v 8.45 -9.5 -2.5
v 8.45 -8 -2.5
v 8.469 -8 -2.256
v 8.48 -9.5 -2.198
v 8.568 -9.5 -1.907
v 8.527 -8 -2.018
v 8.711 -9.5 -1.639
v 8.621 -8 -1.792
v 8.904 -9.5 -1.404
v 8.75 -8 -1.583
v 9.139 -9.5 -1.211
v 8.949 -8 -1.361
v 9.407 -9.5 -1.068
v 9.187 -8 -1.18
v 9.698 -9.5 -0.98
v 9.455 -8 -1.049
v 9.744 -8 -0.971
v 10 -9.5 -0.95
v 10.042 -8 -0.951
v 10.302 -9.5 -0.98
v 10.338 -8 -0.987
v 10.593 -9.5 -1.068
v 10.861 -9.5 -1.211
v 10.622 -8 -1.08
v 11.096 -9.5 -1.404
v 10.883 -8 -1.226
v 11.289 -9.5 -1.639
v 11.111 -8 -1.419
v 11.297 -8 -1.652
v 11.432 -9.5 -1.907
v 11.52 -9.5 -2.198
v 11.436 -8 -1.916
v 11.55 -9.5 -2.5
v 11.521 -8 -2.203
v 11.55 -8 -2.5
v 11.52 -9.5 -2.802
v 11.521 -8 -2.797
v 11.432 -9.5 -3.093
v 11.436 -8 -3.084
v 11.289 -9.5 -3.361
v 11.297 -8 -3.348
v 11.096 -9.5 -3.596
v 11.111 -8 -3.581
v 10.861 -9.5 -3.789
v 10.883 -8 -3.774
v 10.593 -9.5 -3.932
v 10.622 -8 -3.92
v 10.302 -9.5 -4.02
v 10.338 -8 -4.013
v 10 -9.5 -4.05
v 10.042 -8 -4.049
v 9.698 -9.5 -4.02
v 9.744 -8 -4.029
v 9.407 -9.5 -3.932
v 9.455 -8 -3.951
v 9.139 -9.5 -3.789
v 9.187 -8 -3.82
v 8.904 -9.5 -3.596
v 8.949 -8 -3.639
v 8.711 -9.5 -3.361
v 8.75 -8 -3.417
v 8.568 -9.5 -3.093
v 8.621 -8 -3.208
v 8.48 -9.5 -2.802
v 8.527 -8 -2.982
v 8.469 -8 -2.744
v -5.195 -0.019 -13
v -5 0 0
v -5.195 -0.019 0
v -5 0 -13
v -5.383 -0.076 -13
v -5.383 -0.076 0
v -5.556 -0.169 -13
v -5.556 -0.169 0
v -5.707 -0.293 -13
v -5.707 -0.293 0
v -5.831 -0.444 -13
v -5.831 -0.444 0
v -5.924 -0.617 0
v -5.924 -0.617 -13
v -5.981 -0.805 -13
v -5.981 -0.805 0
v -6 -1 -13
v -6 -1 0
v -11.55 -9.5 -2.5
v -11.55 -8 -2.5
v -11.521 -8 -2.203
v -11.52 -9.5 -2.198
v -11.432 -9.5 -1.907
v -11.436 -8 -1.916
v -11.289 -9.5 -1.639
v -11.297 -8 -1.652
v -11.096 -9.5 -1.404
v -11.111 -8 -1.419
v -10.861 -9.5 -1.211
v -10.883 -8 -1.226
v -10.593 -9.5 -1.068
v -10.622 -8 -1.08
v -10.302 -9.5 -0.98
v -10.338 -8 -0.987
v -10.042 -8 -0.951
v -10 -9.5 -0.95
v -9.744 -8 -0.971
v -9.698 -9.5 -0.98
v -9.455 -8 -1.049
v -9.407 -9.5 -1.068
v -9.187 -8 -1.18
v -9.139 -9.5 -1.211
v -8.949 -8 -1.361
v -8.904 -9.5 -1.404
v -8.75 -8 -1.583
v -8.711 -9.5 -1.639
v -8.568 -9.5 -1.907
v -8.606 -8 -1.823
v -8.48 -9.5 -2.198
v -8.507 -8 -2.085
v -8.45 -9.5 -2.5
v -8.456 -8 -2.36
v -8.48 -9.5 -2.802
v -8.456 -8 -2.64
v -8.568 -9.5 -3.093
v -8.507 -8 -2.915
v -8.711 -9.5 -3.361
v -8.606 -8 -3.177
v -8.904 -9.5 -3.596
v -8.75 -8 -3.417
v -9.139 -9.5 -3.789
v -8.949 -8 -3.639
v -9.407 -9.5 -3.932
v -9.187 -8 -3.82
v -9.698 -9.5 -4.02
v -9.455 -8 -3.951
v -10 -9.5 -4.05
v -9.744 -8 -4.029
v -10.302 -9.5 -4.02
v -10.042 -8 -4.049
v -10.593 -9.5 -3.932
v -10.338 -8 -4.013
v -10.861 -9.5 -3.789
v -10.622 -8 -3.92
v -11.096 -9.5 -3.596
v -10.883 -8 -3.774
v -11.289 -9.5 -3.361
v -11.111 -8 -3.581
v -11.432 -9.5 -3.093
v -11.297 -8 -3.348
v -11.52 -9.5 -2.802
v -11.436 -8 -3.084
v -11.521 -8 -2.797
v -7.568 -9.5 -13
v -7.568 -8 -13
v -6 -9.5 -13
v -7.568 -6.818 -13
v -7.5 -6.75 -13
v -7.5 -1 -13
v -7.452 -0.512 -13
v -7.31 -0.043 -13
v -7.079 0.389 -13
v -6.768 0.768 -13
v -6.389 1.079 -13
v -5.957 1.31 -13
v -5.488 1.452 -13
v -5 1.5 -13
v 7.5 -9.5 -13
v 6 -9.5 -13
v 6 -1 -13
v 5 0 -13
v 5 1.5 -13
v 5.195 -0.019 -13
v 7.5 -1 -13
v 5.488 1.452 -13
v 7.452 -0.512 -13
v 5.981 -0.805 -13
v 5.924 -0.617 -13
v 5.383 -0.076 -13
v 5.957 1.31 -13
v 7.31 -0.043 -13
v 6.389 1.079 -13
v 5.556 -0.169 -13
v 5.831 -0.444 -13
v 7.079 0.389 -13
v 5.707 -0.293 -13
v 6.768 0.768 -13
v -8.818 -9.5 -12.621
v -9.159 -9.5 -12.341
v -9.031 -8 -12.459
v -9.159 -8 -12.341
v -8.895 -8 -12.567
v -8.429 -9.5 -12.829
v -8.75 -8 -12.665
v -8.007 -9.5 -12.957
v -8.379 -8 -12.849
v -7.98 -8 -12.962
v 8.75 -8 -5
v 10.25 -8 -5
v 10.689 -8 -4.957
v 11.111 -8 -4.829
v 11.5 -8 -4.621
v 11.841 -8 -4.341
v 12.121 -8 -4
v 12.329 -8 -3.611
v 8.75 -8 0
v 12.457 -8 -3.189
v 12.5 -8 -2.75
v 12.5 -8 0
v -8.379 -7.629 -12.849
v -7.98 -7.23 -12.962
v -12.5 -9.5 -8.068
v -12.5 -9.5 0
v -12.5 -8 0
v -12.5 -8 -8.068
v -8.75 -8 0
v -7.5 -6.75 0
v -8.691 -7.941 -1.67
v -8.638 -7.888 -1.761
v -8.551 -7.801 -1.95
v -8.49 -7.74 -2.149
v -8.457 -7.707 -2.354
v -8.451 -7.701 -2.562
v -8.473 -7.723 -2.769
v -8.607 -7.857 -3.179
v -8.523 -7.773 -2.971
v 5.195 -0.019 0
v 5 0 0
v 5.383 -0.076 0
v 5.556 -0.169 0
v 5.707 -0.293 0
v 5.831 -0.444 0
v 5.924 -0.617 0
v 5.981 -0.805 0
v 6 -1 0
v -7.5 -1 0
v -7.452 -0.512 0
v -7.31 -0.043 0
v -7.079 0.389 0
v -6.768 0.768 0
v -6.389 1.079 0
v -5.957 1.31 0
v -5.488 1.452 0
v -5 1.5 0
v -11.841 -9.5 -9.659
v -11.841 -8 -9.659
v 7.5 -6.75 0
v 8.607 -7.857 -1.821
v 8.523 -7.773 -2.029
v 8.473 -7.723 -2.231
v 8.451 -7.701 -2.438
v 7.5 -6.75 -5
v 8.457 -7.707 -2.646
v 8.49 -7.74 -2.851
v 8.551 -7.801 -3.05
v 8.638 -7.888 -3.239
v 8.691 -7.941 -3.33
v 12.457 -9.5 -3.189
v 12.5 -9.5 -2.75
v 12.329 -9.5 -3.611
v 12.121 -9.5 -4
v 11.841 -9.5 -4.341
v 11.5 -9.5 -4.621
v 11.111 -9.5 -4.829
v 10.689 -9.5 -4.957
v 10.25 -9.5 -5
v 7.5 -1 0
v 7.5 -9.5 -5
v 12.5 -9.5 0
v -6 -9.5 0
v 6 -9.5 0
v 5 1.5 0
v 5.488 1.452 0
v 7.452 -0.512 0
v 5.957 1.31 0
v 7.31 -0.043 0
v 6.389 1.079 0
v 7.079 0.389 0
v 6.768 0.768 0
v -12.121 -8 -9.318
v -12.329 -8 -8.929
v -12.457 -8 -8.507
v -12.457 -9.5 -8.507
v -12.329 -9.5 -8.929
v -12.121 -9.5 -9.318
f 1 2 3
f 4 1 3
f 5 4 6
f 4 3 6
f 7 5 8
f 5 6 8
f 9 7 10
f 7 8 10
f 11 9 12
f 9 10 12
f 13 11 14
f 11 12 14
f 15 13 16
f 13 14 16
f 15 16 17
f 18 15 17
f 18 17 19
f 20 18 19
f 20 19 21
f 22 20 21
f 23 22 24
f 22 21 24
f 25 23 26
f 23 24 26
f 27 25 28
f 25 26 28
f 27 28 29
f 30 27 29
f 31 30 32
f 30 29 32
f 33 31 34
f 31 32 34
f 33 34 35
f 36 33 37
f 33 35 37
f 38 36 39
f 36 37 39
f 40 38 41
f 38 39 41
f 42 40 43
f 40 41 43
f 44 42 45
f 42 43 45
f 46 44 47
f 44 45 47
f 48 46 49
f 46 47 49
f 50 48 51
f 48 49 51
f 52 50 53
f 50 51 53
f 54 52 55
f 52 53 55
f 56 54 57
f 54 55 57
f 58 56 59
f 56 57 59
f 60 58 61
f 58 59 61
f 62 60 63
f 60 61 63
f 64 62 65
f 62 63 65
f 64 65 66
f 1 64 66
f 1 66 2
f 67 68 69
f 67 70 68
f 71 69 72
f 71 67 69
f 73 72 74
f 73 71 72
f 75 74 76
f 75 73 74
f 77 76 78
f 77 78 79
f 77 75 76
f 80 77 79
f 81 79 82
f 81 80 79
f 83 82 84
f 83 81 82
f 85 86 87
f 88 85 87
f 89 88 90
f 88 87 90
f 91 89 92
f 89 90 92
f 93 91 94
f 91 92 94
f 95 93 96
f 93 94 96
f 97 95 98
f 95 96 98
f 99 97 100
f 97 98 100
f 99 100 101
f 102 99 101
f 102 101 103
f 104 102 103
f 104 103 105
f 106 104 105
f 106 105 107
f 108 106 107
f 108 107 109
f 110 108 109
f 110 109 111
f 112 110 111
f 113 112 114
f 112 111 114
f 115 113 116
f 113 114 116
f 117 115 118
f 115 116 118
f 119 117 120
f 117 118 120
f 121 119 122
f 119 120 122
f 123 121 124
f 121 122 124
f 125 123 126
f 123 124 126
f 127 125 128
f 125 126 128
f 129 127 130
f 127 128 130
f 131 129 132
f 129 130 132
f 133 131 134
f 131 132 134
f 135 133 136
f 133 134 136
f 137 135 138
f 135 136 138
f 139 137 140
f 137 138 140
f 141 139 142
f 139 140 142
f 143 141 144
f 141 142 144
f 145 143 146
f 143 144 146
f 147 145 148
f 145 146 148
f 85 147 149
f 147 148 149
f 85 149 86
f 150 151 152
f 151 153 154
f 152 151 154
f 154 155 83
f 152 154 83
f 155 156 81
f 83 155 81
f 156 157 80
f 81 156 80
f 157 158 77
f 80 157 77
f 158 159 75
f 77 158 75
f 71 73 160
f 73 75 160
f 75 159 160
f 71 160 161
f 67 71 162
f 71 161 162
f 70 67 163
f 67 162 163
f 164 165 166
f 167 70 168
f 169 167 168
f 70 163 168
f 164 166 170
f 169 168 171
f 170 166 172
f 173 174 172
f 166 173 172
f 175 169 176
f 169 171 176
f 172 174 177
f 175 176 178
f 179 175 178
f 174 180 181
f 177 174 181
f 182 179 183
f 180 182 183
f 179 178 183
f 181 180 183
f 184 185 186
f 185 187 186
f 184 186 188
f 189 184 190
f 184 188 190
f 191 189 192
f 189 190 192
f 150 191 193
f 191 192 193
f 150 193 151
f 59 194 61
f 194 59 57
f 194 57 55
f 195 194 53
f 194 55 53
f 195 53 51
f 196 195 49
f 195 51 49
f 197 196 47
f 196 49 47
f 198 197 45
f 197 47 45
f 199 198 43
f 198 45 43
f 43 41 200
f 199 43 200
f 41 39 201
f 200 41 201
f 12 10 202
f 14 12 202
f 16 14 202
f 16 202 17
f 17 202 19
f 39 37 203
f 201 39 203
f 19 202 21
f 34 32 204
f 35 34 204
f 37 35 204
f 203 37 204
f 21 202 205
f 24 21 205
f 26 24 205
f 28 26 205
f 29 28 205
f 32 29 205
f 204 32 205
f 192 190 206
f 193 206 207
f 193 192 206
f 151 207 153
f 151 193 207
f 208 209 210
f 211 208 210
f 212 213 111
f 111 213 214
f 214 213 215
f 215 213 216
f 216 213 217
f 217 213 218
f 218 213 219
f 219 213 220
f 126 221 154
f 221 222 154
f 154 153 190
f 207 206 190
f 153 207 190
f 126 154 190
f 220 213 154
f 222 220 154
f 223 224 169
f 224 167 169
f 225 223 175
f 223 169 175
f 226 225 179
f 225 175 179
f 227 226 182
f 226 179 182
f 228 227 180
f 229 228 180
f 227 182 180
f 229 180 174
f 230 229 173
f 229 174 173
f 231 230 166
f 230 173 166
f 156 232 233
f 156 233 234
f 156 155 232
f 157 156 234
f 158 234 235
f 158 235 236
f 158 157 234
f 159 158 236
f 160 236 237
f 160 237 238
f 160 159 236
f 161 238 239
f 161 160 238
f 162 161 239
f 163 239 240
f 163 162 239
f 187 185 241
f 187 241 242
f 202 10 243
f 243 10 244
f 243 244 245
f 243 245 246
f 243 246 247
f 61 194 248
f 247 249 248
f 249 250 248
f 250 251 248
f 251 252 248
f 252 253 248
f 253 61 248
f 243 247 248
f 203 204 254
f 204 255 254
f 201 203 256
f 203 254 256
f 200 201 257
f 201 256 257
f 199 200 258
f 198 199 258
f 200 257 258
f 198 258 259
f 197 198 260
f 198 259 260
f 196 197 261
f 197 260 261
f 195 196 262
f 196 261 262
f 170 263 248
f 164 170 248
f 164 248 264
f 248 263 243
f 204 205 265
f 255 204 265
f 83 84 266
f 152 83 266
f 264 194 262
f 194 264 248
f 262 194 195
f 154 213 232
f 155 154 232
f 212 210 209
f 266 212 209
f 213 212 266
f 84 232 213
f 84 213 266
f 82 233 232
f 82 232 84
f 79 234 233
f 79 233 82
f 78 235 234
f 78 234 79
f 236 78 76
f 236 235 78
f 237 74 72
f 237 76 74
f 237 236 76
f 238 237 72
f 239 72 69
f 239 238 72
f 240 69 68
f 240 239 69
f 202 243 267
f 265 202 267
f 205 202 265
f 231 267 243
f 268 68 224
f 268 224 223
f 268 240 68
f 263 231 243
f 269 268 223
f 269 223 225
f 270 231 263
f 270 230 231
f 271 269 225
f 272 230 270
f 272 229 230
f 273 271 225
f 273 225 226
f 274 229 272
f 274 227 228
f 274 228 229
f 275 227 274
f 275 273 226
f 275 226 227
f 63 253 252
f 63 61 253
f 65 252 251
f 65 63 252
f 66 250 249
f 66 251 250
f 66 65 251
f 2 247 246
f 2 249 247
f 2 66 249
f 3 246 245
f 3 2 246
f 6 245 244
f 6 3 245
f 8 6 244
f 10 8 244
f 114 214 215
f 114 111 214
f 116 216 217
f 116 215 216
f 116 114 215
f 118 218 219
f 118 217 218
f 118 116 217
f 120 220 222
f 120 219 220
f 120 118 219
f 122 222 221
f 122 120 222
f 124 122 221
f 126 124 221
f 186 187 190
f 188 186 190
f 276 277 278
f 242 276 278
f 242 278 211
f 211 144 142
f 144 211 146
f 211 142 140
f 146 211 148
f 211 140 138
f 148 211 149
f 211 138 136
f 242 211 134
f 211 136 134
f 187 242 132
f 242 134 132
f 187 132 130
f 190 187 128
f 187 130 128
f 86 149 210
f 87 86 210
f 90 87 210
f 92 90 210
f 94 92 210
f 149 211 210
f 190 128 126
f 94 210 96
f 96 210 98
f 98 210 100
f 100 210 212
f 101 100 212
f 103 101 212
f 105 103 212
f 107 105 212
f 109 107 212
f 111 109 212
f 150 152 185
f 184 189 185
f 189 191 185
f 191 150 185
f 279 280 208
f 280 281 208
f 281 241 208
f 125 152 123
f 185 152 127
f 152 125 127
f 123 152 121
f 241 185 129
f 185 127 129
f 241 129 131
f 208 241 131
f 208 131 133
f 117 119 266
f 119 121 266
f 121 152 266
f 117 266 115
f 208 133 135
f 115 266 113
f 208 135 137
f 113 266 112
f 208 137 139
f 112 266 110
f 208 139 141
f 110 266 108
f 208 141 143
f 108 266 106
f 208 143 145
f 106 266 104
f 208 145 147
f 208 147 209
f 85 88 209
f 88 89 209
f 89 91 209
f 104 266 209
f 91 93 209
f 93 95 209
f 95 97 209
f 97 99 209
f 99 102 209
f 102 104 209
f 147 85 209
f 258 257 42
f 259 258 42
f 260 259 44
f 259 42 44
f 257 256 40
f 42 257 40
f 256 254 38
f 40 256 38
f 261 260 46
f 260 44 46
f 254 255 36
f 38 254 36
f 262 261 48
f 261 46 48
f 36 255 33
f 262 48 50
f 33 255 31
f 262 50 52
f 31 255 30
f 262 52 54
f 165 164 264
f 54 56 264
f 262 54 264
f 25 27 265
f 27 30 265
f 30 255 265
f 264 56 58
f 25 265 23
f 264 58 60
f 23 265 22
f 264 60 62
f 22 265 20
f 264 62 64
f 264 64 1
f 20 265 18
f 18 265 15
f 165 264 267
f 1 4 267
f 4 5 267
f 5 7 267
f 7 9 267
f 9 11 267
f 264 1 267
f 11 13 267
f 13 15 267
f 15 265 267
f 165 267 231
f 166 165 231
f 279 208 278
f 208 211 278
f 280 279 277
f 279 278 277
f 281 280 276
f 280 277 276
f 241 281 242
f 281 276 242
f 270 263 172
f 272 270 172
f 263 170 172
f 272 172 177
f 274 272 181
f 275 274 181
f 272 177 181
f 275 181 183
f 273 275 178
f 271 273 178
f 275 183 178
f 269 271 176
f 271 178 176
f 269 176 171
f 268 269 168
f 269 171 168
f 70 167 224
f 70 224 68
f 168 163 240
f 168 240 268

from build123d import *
from build123d.topology import SkipClean

# Parameters (mm, degrees)
BOSS_EXTRUDE1_DEPTH = 13
SKETCH2_W           = 5
SKETCH2_H           = 8
CUT_EXTRUDE1_DEPTH  = 21.383817111
SKETCH3_R           = 1.55
CUT_EXTRUDE2_DEPTH  = 21.383817111
FILLET1_R           = 1
FILLET2_R           = 2.5
CHAMFER1_SIZE       = 4
FILLET3_R           = 2.25
FILLET4_R           = 2.25
CHAMFER2_START      = -13
CHAMFER2_DEPTH      = 13
CHAMFER2_START_2    = -5
CHAMFER2_2_DEPTH    = 5
CHAMFER2_START_3    = -8
CHAMFER2_3_DEPTH    = 1.181980515


with BuildPart() as part:
    # Sketch1 → Boss-Extrude1 (new body)
    with BuildSketch(Plane.XY):
        Polygon((6, 0), (-6, 0), (-6, -9.5), (-12.5, -9.5), (-12.5, -8), (-7.5, -8), (-7.5, 1.5), (7.5, 1.5), (7.5, -8), (12.5, -8), (12.5, -9.5), (6, -9.5), align=None)
    extrude(amount=-BOSS_EXTRUDE1_DEPTH)

    # Sketch2 → Cut-Extrude1 (cut, through all)
    with BuildSketch(Plane(origin=(0, -8, 0), x_dir=(1, 0, 0), z_dir=(0, 1, 0))):
        with Locations((10, 9)):
            Rectangle(SKETCH2_W, SKETCH2_H)
    extrude(amount=-CUT_EXTRUDE1_DEPTH, mode=Mode.SUBTRACT)

    # Sketch3 → Cut-Extrude2 (cut, through all)
    with BuildSketch(Plane(origin=(0, -8, 0), x_dir=(1, 0, 0), z_dir=(0, 1, 0))):
        with Locations(Location((10, 2.5, 0), (0, 0, 180))):
            Circle(SKETCH3_R)
        with Locations(Location((-10, 2.5, 0), (0, 0, 180))):
            Circle(SKETCH3_R)
    extrude(amount=-CUT_EXTRUDE2_DEPTH, mode=Mode.SUBTRACT)

    # Fillet1
    fillet1_edges = [part.edges().sort_by_distance(p)[0] for p in [
        (6, 0, -6.5),
        (-6, 0, -6.5),
    ]]
    fillet(fillet1_edges, radius=FILLET1_R)

    # Fillet2
    fillet2_edges = [part.edges().sort_by_distance(p)[0] for p in [
        (-7.5, 1.5, -6.5),
        (7.5, 1.5, -6.5),
    ]]
    fillet(fillet2_edges, radius=FILLET2_R)

    # Chamfer1
    chamfer1_edges = [part.edges().sort_by_distance(p)[0] for p in [
        (-12.5, -8.75, -13),
    ]]
    chamfer(chamfer1_edges, length=CHAMFER1_SIZE)

    # Fillet3
    fillet3_edges = [part.edges().sort_by_distance(p)[0] for p in [
        (-12.5, -8.75, -9),
        (-8.5, -8.75, -13),
    ]]
    fillet(fillet3_edges, radius=FILLET3_R)

    # Fillet4
    fillet4_edges = [part.edges().sort_by_distance(p)[0] for p in [
        (12.5, -8.75, -5),
    ]]
    fillet(fillet4_edges, radius=FILLET4_R)

    # Chamfer2: read off the stored shape, not the designer's step
    # Chamfer2 outline → Chamfer2 (add)
    with BuildSketch(Plane.XY.offset(CHAMFER2_START)):
        Polygon((-7.5, -8), (-7.5, -6.75), (-8.75, -8), align=None)
    extrude(amount=CHAMFER2_DEPTH)

    # Chamfer2 2 outline → Chamfer2 2 (add)
    with BuildSketch(Plane.XY.offset(CHAMFER2_START_2)):
        Polygon((7.5, -8), (8.75, -8), (7.5, -6.75), align=None)
    extrude(amount=CHAMFER2_2_DEPTH)

    # Chamfer2 3 outline → Chamfer2 3 (cut)
    with SkipClean():  # the faces are left unmerged after this step: merging them gives an invalid solid
        with BuildSketch(Plane(origin=(0, 0, 0), x_dir=(1, 0, 0), z_dir=(0, 1, 0)).offset(CHAMFER2_START_3)):
            with BuildLine():
                Line((8.75, 1.583484861), (8.75, 3.416515139))
                ThreePointArc((8.75, 3.416515139), (8.45, 2.5), (8.75, 1.583484861))
            make_face()
            with BuildLine():
                Line((-7.568019485, 13), (-8.75, 13))
                Line((-8.75, 13), (-8.75, 12.664529201))
                ThreePointArc((-8.75, 12.664529201), (-8.182352171, 12.914508108), (-7.568019485, 13))
            make_face()
            with BuildLine():
                ThreePointArc((-8.75, 1.583484861), (-8.45, 2.5), (-8.75, 3.416515139))
                Line((-8.75, 3.416515139), (-8.75, 1.583484861))
            make_face()
        extrude(amount=CHAMFER2_3_DEPTH, mode=Mode.SUBTRACT)


solid = part.part
